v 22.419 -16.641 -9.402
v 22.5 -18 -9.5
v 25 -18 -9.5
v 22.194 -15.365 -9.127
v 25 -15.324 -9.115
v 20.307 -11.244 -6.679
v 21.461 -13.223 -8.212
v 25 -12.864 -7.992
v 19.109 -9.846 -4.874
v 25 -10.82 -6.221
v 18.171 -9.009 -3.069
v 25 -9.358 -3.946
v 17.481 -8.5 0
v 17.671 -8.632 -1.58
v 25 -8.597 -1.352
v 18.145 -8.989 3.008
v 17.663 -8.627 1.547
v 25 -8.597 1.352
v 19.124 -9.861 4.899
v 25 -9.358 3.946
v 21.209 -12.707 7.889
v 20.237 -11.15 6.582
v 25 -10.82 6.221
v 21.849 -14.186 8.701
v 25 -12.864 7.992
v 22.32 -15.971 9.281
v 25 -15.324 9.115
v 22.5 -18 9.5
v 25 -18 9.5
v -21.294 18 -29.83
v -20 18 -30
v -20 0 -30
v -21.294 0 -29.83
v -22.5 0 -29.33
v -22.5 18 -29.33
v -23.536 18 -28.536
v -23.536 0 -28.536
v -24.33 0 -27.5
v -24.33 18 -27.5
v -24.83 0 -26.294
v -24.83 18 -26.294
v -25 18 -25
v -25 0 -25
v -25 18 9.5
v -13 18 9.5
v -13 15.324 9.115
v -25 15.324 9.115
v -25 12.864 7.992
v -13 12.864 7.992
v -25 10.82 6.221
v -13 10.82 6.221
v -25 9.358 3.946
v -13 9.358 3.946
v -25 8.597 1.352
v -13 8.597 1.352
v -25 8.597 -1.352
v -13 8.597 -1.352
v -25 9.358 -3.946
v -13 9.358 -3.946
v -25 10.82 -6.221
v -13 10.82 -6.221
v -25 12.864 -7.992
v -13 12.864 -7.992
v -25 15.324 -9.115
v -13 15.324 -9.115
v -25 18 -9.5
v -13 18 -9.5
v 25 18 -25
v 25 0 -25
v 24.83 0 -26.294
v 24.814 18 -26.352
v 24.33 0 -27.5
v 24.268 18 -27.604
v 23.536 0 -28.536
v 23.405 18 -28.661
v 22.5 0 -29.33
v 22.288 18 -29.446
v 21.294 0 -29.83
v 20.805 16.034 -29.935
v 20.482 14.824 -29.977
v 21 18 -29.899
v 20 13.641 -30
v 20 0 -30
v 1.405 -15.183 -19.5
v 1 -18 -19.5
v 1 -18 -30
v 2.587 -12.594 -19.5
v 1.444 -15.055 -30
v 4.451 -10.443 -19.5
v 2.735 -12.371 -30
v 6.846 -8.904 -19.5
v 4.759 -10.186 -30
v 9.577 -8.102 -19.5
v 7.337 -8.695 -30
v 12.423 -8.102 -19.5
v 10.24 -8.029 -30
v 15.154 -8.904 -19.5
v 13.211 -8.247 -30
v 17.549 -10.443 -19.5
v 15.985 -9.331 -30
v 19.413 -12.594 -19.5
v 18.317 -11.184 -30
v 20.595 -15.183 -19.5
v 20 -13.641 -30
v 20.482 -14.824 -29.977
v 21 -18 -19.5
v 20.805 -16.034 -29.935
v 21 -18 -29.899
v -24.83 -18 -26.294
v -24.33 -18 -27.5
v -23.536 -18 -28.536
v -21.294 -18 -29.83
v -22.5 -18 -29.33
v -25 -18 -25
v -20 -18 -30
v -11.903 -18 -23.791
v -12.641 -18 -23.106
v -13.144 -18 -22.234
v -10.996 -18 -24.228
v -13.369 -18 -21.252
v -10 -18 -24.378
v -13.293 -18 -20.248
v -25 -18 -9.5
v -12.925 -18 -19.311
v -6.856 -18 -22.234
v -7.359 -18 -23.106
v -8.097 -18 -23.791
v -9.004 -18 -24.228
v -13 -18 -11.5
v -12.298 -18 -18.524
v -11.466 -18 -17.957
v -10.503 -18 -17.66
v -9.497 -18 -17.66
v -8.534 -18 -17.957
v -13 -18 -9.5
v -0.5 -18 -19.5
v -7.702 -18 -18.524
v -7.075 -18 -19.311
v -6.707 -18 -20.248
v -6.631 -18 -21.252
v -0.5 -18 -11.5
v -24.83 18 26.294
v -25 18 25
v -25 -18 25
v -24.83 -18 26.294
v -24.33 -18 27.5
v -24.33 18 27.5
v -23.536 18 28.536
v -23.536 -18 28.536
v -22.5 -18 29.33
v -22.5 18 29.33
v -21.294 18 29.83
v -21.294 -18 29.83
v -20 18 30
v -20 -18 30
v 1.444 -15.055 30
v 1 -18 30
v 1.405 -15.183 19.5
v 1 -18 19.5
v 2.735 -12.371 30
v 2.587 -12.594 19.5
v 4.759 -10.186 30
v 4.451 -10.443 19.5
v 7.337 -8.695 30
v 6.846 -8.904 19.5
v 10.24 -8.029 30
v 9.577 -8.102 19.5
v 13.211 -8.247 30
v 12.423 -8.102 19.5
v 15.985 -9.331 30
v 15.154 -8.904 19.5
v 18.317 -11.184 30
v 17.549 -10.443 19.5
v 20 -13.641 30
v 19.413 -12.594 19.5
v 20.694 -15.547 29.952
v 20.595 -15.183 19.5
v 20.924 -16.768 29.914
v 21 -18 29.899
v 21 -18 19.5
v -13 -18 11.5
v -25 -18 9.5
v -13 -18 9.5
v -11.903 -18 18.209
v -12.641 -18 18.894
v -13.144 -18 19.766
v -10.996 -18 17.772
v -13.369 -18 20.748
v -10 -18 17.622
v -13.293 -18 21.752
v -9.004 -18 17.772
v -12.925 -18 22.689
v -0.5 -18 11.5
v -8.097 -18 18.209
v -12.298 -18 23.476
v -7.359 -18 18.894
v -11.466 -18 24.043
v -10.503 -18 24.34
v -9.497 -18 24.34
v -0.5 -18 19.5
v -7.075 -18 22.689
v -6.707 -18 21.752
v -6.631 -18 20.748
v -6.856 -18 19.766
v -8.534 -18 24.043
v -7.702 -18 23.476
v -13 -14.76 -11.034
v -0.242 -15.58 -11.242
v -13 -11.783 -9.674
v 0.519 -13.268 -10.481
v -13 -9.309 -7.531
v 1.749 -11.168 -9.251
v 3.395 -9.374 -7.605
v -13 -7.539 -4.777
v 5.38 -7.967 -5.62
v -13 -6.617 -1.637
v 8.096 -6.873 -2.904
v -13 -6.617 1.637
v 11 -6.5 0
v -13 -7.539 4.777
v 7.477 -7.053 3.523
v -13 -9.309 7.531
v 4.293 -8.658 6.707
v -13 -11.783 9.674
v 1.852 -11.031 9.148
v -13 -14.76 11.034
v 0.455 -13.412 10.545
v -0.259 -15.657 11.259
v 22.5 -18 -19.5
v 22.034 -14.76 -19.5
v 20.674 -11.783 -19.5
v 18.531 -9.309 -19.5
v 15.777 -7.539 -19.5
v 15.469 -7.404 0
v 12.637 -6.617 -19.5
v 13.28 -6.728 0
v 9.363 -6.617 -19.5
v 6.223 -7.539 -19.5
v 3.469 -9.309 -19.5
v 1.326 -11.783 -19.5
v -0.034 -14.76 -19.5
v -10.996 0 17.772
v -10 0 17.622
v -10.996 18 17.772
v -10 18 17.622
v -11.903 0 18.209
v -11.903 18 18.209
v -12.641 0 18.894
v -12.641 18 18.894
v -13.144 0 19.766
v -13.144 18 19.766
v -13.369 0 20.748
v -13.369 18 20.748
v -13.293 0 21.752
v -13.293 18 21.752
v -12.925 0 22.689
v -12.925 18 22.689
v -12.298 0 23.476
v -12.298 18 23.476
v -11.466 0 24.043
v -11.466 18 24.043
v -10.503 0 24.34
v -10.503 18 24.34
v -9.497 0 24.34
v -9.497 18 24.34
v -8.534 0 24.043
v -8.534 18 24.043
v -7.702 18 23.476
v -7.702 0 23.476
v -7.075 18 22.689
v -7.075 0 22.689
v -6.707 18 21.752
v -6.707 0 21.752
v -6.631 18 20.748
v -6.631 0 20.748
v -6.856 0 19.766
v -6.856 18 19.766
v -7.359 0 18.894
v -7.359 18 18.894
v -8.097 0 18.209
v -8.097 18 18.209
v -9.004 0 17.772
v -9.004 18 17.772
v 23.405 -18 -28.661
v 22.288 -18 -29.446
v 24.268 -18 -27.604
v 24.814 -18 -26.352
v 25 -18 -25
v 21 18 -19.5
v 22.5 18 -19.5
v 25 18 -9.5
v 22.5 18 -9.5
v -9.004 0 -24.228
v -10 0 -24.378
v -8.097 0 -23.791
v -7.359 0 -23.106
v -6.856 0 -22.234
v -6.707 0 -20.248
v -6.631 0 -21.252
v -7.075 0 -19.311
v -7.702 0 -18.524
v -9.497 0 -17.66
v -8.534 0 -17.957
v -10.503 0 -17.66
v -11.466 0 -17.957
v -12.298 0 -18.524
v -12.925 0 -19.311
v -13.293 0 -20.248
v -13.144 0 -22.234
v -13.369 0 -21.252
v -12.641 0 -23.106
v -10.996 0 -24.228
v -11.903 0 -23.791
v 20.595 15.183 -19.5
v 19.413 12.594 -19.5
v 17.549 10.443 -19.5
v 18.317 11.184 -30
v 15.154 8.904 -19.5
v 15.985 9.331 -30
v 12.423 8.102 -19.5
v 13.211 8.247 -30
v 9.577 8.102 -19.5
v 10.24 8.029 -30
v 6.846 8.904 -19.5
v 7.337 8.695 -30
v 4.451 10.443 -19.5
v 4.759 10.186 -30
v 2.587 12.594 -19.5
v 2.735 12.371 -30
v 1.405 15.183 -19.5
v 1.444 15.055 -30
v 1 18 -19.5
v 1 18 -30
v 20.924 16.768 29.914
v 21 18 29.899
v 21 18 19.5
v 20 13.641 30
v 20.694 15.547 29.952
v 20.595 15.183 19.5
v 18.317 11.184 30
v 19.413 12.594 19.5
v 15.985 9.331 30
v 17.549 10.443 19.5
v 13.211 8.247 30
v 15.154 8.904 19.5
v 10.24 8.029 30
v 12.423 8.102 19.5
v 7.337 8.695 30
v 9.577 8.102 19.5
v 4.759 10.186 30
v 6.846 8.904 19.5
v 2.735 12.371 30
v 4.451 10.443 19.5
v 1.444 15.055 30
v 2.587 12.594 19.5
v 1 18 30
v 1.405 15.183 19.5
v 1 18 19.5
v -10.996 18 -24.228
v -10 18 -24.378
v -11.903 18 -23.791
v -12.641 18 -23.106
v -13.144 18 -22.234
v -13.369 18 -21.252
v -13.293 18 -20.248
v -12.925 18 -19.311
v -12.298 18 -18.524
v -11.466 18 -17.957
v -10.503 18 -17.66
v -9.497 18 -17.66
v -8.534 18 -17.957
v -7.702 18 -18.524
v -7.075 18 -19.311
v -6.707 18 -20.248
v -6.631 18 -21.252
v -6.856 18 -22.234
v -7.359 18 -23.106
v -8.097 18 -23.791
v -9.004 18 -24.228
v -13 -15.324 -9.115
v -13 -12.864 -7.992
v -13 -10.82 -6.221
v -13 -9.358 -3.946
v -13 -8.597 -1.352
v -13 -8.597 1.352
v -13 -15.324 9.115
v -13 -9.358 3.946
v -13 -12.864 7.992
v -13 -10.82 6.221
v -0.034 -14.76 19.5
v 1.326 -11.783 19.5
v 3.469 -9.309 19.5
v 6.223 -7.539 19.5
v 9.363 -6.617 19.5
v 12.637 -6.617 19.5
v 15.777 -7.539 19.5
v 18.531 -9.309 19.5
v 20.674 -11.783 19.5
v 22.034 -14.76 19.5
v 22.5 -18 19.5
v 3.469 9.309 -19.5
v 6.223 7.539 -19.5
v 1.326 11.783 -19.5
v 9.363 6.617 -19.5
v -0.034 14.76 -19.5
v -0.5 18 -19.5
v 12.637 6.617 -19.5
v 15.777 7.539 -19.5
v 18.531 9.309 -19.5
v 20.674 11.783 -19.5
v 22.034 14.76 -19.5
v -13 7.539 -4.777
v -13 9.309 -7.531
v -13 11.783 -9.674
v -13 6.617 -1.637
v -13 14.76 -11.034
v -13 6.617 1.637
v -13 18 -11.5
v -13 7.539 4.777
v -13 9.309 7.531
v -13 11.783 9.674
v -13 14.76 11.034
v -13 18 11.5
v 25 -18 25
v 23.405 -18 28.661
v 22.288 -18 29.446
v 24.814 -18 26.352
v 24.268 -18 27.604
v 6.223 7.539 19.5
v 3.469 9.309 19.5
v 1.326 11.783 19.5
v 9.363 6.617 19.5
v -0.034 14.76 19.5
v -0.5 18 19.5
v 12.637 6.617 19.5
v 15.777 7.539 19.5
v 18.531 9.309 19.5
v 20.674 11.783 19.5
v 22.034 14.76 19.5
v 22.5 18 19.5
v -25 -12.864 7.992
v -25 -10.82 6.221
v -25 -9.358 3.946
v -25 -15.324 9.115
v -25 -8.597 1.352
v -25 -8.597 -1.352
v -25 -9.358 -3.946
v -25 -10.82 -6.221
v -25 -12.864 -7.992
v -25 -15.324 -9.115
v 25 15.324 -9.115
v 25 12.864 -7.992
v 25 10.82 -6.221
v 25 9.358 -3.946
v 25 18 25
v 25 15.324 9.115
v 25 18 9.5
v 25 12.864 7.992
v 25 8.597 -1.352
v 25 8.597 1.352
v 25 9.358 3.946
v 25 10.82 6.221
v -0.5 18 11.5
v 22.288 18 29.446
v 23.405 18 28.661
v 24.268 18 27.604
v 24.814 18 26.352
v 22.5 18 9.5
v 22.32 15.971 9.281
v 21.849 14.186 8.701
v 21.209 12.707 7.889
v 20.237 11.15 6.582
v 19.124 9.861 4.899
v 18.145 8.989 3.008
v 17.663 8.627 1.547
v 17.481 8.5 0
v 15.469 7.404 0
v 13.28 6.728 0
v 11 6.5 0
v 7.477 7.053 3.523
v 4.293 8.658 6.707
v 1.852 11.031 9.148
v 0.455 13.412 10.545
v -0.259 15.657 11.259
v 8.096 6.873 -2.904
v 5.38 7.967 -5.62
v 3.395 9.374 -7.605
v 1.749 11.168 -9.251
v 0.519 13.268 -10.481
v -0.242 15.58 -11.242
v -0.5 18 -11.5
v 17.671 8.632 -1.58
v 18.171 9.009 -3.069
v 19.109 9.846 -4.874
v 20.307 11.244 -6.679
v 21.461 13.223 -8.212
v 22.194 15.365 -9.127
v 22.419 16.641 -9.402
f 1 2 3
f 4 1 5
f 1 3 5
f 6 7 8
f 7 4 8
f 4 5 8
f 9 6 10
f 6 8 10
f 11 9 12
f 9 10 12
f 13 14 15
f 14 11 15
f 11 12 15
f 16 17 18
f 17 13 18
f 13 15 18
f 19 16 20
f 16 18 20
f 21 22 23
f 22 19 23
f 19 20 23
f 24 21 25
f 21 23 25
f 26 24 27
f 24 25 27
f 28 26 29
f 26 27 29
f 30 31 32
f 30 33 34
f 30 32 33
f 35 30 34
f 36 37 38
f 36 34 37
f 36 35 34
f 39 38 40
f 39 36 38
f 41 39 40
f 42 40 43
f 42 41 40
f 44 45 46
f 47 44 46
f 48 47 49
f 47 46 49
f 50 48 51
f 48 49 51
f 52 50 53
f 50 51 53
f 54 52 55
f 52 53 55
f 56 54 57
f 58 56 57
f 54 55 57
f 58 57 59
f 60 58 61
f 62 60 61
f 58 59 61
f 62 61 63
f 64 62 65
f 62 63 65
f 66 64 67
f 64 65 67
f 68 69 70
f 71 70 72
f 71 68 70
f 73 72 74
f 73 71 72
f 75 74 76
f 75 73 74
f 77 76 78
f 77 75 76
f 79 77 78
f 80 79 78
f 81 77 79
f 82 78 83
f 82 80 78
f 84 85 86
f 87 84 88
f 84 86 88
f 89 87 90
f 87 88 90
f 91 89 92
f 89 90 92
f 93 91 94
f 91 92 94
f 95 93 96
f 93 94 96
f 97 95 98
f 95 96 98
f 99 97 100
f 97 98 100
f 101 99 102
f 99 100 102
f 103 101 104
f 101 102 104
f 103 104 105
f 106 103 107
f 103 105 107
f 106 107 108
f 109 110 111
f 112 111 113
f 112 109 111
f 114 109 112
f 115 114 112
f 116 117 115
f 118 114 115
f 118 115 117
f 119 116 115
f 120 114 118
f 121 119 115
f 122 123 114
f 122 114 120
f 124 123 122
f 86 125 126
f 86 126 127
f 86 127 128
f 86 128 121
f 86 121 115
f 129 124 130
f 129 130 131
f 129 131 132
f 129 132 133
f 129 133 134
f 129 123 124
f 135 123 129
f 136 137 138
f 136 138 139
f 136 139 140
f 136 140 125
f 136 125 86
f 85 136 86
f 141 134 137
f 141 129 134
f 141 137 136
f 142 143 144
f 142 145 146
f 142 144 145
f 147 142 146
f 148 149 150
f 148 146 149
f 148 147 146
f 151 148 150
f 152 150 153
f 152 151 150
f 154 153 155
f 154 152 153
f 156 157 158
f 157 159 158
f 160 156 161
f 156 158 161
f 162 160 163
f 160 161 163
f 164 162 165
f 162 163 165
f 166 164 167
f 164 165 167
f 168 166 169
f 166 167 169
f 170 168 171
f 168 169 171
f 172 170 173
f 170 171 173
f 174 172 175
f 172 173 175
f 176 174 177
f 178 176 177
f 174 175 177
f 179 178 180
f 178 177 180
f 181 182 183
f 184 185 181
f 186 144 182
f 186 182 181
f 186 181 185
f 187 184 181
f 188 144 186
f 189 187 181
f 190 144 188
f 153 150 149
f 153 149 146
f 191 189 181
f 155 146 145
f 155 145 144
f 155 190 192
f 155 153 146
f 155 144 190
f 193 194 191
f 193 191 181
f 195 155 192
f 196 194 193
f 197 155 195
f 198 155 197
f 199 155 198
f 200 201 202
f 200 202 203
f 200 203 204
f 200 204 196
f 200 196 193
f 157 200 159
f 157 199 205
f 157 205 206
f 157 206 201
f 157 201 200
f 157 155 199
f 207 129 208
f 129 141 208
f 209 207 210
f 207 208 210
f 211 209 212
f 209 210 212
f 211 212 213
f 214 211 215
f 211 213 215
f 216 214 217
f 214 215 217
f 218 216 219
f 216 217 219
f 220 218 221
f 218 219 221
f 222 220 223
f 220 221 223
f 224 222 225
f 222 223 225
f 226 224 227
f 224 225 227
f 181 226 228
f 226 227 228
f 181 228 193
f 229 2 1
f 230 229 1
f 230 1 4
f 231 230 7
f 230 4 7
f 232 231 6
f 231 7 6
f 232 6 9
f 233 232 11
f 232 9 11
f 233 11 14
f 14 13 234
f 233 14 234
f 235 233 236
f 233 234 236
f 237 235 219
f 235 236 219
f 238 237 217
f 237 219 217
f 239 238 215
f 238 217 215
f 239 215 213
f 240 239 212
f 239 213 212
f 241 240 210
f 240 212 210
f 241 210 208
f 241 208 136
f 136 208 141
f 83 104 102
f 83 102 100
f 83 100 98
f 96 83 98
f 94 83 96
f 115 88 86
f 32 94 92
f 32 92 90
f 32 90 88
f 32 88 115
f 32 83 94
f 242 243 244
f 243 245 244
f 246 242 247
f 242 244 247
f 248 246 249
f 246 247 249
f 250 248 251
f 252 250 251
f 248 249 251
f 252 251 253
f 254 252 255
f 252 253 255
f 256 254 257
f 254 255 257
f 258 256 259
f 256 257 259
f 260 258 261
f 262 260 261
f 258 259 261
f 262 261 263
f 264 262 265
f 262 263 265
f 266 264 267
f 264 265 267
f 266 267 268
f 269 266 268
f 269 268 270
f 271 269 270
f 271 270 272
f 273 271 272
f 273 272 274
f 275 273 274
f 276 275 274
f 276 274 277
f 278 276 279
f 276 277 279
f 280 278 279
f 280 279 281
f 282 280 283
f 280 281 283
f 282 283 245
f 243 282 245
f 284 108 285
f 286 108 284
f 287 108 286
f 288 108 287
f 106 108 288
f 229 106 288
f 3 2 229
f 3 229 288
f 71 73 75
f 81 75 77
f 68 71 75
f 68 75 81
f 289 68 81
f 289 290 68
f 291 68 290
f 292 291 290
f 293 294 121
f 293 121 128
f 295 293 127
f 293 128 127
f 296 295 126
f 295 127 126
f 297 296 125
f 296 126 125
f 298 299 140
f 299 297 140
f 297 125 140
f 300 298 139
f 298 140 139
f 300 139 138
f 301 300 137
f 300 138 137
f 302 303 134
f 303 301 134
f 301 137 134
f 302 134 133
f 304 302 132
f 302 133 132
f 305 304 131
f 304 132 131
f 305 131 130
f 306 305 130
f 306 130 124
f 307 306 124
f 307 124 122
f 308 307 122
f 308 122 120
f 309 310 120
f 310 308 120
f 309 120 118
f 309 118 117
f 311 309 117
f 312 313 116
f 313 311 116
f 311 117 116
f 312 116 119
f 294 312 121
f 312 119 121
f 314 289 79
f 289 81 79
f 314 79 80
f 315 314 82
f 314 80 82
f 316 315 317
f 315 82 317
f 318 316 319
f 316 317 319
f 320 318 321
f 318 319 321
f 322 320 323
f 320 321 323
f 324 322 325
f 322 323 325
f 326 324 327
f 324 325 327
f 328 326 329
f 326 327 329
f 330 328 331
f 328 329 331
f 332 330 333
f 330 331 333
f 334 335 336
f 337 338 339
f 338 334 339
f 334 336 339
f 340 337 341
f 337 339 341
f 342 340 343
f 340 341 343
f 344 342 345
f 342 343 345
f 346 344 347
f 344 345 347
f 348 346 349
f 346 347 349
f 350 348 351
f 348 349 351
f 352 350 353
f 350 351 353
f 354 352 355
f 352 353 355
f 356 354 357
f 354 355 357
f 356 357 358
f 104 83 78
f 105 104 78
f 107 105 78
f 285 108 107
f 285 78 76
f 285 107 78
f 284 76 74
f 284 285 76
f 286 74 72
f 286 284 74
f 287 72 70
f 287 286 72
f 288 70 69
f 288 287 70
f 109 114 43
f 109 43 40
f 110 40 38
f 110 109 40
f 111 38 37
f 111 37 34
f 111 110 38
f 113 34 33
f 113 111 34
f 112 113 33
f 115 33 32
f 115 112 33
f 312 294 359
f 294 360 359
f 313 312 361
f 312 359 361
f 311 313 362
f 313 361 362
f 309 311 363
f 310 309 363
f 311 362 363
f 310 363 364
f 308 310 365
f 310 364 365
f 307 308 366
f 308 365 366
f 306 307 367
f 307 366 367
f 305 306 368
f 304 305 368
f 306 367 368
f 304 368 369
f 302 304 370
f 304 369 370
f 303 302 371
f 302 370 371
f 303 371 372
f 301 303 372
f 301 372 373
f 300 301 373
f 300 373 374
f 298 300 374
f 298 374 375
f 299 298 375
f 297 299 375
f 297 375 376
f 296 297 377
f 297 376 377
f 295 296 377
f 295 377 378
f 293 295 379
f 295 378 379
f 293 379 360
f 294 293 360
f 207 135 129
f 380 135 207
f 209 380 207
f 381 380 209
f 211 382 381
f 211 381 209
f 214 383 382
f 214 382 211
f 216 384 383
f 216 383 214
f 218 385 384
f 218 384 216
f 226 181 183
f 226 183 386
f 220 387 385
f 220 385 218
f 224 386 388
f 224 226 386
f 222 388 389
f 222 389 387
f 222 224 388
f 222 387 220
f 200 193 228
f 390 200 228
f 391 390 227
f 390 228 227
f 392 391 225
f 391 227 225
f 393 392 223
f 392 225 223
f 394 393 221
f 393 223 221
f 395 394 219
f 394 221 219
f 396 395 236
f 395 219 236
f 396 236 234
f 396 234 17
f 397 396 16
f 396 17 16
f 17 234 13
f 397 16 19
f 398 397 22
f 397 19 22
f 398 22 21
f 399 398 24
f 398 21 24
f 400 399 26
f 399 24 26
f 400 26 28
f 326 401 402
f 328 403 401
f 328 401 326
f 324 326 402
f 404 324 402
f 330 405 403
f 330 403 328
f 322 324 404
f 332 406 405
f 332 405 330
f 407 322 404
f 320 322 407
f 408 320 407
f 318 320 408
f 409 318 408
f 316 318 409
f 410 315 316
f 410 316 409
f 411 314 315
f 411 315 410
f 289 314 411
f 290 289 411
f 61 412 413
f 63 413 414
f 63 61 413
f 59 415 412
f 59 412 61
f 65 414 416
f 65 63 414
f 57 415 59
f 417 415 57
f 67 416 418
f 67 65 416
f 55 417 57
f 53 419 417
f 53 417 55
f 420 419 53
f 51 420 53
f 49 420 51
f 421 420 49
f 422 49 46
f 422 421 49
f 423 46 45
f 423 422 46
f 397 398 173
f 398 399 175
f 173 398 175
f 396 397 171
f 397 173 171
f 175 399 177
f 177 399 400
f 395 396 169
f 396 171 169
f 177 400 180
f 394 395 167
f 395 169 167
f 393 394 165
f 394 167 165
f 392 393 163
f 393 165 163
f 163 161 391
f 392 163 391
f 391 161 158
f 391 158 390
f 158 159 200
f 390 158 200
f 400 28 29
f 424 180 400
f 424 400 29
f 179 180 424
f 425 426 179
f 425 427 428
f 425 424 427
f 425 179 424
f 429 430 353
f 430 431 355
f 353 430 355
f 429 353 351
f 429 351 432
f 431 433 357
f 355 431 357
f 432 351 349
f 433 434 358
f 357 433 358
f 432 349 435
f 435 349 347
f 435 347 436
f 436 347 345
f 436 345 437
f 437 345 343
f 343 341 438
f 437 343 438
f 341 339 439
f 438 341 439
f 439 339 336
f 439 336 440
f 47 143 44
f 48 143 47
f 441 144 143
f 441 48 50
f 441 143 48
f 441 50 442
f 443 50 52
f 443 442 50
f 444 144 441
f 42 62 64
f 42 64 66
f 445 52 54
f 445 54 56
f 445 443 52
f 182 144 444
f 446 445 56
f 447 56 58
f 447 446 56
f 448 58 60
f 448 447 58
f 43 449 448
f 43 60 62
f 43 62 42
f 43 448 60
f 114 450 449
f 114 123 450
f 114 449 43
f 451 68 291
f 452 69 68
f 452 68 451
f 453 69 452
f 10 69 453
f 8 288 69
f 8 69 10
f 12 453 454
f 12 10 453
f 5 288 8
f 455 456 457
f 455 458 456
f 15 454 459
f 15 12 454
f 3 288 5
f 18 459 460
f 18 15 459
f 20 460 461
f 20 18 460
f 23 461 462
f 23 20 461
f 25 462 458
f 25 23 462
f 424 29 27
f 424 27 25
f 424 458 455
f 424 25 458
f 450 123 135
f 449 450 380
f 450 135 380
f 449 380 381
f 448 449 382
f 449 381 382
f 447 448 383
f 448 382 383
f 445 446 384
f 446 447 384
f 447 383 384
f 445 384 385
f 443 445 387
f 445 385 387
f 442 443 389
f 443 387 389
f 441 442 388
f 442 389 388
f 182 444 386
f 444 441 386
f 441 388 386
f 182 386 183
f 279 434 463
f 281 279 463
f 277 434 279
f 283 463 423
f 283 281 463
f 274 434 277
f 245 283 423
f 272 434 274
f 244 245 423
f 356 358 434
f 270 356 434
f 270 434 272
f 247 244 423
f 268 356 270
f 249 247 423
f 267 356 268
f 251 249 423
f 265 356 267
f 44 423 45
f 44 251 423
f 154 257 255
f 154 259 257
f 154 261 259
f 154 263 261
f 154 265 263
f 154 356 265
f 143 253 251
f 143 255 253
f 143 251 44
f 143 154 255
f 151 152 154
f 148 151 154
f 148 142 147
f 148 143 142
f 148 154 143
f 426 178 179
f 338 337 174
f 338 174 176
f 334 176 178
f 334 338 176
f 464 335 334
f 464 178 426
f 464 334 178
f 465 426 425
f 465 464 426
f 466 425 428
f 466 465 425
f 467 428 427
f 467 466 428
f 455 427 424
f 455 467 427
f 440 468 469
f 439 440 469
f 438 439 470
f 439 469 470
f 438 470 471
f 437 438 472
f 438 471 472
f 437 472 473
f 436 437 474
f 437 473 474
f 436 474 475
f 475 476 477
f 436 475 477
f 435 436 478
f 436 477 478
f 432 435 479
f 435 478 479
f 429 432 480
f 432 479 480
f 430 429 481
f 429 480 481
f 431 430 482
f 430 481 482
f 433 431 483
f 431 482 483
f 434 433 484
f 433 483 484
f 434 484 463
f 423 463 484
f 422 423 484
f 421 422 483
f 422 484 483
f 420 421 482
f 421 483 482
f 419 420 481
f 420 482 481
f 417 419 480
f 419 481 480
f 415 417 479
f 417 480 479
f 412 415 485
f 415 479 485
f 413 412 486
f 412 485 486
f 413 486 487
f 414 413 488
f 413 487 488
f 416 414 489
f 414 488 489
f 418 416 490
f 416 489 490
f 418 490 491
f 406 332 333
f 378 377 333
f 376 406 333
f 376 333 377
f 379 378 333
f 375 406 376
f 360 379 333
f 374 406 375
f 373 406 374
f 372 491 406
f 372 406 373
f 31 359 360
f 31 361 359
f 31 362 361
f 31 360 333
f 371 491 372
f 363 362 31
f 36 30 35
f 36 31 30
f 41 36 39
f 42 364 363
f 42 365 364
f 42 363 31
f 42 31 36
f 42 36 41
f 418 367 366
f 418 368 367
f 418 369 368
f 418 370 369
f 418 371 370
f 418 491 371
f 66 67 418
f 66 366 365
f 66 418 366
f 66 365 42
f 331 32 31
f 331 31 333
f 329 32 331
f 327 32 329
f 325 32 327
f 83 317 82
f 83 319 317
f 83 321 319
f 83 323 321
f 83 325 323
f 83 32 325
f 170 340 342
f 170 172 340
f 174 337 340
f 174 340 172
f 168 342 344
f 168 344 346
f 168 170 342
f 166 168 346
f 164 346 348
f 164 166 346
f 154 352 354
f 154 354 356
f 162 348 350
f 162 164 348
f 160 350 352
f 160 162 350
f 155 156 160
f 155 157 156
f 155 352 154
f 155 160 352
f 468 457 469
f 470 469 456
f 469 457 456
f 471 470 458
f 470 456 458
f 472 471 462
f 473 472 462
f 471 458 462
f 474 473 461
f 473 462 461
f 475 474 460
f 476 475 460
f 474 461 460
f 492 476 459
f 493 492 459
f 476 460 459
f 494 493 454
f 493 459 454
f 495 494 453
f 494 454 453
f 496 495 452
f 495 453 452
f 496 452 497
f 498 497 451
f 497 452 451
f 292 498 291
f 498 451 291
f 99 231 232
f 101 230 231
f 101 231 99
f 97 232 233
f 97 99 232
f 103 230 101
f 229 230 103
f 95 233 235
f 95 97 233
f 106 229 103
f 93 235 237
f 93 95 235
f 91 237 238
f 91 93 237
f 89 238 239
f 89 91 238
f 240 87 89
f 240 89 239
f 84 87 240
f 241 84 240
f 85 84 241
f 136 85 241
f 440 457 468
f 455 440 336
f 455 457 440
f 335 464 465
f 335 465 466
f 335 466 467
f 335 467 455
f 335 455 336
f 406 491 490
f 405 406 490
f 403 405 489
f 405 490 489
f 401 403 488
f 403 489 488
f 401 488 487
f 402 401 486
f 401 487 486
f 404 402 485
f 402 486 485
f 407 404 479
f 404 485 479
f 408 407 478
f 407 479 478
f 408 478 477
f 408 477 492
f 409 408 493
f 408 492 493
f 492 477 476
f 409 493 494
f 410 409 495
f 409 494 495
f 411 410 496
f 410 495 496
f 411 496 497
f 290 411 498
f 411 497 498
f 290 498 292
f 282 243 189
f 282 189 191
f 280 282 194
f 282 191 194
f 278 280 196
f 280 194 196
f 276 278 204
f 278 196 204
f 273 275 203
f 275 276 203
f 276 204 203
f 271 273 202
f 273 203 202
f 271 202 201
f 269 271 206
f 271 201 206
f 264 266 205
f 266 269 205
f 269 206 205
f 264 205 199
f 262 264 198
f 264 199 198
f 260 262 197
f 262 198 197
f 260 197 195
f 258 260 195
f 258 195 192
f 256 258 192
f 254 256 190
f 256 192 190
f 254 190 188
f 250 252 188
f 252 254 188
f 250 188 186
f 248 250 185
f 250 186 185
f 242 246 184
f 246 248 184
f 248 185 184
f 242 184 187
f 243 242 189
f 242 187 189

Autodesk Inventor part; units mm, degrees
ref_plane "XZ Plane" through (0, 0, 0) normal (0, 1, 0) x (-1, 0, 0)
ref_plane "XY Plane" through (0, 0, 0) normal (0, 0, 1) x (1, 0, 0)
sketch "Sketch1" plane through (0, 0, 0) normal (0, 1, 0) x (-1, 0, 0)
  line L0 (-25, 30) -> (25, 30)
  line L1 (25, 30) -> (25, -30)
  line L2 (25, -30) -> (-25, -30)
  line L3 (-25, -30) -> (-25, 30)
  line L4 (-25, 30) -> (25, -30) construction
  line L5 (25, 30) -> (-25, -30) construction
  point P0 (0, 0)
  dimension "d0" = 50
  dimension "d1" = 60
extrude "Extrusion1" add sketch "Sketch1" along normal blind 18
sketch "Sketch2" plane through (25, 0, 30) normal (1, 0, 0) x (0, 0, -1)
  line L0 (60, 18) -> (0, 18) projected
  circle A0 centre (30, 18) radius 9.5
  point P0 (30, 0)
  point P1 (20.5, 18)
  point P2 (39.5, 18)
  dimension "d4" = 19
extrude "Extrusion2" cut sketch "Sketch2" against normal through all contours A0 L0 picked at (28.8771, 15.0391)
sketch "Sketch3" plane through (25, 0, -30) normal (0, 0, -1) x (-1, 0, 0)
  line L0 (0, 18) -> (50, 18) projected
  circle A0 centre (14, 18) radius 10
  point P0 (25, 0)
  point P1 (24, 18)
  point P2 (4, 18)
  dimension "d7" = 20
  dimension "d8" = 14
extrude "Extrusion3" cut sketch "Sketch3" against normal through all contours L0 A0 picked at (12.1065, 15.2567)
sketch "Sketch4" plane through (0, 0, 0) normal (0, 0, 1) x (1, 0, 0)
  arc A0 (1, 18) -> (21, 18) centre (11, 18) ccw projected
  circle A1 centre (11, 18) radius 11.5
  point P0 (0, 0)
  dimension "d11" = 23
extrude "Extrusion4" cut sketch "Sketch4" along normal mid plane 39
ref_plane "Work Plane2" through (11, 18, -30) normal (1, 0, 0) x (0, 1, 0)
sketch "Sketch5" plane through (11, 18, -30) normal (1, 0, 0) x (0, 1, 0)
  arc A0 (0, 39.5) -> (0, 20.5) centre (0, 30) ccw projected
  circle A1 centre (0, 30) radius 11.5
  point P0 (-18, 30)
  dimension "d14" = 23
extrude "Extrusion5" cut sketch "Sketch5" against normal blind 24
sketch "Sketch7" plane through (0, 0, 0) normal (0, -1, 0) x (1, 0, 0)
  line L0 (25, -30) -> (-25, -30) projected
  line L1 (-25, 30) -> (25, 30) projected
  line L2 (-25, -30) -> (-25, 30) projected
  point P0 (0, 0)
  point P1 (-10, -21)
  point P2 (-10, 21)
  dimension "d28" = 9
  dimension "d29" = 9
  dimension "d30" = 15
hole "Hole2" at (-10, 0, -21) at (-10, 0, 21) direction (0, 1, 0) diameter 6.756 end through all clearance for "Socket Head Cap Screw" size "1/4" standard "Ansi Unified Screw Threads"
fillet "Fillet1" radius 5 4 edges at (-25, 9, -30) (-25, 9, 30) (25, 9, 30) (25, 9, -30)
mirror "Mirror1" about plane through (0, 0, 0) normal (0, -1, 0)
equation "\"d28\" = d29"
properties part number "Valve Block Middle"
